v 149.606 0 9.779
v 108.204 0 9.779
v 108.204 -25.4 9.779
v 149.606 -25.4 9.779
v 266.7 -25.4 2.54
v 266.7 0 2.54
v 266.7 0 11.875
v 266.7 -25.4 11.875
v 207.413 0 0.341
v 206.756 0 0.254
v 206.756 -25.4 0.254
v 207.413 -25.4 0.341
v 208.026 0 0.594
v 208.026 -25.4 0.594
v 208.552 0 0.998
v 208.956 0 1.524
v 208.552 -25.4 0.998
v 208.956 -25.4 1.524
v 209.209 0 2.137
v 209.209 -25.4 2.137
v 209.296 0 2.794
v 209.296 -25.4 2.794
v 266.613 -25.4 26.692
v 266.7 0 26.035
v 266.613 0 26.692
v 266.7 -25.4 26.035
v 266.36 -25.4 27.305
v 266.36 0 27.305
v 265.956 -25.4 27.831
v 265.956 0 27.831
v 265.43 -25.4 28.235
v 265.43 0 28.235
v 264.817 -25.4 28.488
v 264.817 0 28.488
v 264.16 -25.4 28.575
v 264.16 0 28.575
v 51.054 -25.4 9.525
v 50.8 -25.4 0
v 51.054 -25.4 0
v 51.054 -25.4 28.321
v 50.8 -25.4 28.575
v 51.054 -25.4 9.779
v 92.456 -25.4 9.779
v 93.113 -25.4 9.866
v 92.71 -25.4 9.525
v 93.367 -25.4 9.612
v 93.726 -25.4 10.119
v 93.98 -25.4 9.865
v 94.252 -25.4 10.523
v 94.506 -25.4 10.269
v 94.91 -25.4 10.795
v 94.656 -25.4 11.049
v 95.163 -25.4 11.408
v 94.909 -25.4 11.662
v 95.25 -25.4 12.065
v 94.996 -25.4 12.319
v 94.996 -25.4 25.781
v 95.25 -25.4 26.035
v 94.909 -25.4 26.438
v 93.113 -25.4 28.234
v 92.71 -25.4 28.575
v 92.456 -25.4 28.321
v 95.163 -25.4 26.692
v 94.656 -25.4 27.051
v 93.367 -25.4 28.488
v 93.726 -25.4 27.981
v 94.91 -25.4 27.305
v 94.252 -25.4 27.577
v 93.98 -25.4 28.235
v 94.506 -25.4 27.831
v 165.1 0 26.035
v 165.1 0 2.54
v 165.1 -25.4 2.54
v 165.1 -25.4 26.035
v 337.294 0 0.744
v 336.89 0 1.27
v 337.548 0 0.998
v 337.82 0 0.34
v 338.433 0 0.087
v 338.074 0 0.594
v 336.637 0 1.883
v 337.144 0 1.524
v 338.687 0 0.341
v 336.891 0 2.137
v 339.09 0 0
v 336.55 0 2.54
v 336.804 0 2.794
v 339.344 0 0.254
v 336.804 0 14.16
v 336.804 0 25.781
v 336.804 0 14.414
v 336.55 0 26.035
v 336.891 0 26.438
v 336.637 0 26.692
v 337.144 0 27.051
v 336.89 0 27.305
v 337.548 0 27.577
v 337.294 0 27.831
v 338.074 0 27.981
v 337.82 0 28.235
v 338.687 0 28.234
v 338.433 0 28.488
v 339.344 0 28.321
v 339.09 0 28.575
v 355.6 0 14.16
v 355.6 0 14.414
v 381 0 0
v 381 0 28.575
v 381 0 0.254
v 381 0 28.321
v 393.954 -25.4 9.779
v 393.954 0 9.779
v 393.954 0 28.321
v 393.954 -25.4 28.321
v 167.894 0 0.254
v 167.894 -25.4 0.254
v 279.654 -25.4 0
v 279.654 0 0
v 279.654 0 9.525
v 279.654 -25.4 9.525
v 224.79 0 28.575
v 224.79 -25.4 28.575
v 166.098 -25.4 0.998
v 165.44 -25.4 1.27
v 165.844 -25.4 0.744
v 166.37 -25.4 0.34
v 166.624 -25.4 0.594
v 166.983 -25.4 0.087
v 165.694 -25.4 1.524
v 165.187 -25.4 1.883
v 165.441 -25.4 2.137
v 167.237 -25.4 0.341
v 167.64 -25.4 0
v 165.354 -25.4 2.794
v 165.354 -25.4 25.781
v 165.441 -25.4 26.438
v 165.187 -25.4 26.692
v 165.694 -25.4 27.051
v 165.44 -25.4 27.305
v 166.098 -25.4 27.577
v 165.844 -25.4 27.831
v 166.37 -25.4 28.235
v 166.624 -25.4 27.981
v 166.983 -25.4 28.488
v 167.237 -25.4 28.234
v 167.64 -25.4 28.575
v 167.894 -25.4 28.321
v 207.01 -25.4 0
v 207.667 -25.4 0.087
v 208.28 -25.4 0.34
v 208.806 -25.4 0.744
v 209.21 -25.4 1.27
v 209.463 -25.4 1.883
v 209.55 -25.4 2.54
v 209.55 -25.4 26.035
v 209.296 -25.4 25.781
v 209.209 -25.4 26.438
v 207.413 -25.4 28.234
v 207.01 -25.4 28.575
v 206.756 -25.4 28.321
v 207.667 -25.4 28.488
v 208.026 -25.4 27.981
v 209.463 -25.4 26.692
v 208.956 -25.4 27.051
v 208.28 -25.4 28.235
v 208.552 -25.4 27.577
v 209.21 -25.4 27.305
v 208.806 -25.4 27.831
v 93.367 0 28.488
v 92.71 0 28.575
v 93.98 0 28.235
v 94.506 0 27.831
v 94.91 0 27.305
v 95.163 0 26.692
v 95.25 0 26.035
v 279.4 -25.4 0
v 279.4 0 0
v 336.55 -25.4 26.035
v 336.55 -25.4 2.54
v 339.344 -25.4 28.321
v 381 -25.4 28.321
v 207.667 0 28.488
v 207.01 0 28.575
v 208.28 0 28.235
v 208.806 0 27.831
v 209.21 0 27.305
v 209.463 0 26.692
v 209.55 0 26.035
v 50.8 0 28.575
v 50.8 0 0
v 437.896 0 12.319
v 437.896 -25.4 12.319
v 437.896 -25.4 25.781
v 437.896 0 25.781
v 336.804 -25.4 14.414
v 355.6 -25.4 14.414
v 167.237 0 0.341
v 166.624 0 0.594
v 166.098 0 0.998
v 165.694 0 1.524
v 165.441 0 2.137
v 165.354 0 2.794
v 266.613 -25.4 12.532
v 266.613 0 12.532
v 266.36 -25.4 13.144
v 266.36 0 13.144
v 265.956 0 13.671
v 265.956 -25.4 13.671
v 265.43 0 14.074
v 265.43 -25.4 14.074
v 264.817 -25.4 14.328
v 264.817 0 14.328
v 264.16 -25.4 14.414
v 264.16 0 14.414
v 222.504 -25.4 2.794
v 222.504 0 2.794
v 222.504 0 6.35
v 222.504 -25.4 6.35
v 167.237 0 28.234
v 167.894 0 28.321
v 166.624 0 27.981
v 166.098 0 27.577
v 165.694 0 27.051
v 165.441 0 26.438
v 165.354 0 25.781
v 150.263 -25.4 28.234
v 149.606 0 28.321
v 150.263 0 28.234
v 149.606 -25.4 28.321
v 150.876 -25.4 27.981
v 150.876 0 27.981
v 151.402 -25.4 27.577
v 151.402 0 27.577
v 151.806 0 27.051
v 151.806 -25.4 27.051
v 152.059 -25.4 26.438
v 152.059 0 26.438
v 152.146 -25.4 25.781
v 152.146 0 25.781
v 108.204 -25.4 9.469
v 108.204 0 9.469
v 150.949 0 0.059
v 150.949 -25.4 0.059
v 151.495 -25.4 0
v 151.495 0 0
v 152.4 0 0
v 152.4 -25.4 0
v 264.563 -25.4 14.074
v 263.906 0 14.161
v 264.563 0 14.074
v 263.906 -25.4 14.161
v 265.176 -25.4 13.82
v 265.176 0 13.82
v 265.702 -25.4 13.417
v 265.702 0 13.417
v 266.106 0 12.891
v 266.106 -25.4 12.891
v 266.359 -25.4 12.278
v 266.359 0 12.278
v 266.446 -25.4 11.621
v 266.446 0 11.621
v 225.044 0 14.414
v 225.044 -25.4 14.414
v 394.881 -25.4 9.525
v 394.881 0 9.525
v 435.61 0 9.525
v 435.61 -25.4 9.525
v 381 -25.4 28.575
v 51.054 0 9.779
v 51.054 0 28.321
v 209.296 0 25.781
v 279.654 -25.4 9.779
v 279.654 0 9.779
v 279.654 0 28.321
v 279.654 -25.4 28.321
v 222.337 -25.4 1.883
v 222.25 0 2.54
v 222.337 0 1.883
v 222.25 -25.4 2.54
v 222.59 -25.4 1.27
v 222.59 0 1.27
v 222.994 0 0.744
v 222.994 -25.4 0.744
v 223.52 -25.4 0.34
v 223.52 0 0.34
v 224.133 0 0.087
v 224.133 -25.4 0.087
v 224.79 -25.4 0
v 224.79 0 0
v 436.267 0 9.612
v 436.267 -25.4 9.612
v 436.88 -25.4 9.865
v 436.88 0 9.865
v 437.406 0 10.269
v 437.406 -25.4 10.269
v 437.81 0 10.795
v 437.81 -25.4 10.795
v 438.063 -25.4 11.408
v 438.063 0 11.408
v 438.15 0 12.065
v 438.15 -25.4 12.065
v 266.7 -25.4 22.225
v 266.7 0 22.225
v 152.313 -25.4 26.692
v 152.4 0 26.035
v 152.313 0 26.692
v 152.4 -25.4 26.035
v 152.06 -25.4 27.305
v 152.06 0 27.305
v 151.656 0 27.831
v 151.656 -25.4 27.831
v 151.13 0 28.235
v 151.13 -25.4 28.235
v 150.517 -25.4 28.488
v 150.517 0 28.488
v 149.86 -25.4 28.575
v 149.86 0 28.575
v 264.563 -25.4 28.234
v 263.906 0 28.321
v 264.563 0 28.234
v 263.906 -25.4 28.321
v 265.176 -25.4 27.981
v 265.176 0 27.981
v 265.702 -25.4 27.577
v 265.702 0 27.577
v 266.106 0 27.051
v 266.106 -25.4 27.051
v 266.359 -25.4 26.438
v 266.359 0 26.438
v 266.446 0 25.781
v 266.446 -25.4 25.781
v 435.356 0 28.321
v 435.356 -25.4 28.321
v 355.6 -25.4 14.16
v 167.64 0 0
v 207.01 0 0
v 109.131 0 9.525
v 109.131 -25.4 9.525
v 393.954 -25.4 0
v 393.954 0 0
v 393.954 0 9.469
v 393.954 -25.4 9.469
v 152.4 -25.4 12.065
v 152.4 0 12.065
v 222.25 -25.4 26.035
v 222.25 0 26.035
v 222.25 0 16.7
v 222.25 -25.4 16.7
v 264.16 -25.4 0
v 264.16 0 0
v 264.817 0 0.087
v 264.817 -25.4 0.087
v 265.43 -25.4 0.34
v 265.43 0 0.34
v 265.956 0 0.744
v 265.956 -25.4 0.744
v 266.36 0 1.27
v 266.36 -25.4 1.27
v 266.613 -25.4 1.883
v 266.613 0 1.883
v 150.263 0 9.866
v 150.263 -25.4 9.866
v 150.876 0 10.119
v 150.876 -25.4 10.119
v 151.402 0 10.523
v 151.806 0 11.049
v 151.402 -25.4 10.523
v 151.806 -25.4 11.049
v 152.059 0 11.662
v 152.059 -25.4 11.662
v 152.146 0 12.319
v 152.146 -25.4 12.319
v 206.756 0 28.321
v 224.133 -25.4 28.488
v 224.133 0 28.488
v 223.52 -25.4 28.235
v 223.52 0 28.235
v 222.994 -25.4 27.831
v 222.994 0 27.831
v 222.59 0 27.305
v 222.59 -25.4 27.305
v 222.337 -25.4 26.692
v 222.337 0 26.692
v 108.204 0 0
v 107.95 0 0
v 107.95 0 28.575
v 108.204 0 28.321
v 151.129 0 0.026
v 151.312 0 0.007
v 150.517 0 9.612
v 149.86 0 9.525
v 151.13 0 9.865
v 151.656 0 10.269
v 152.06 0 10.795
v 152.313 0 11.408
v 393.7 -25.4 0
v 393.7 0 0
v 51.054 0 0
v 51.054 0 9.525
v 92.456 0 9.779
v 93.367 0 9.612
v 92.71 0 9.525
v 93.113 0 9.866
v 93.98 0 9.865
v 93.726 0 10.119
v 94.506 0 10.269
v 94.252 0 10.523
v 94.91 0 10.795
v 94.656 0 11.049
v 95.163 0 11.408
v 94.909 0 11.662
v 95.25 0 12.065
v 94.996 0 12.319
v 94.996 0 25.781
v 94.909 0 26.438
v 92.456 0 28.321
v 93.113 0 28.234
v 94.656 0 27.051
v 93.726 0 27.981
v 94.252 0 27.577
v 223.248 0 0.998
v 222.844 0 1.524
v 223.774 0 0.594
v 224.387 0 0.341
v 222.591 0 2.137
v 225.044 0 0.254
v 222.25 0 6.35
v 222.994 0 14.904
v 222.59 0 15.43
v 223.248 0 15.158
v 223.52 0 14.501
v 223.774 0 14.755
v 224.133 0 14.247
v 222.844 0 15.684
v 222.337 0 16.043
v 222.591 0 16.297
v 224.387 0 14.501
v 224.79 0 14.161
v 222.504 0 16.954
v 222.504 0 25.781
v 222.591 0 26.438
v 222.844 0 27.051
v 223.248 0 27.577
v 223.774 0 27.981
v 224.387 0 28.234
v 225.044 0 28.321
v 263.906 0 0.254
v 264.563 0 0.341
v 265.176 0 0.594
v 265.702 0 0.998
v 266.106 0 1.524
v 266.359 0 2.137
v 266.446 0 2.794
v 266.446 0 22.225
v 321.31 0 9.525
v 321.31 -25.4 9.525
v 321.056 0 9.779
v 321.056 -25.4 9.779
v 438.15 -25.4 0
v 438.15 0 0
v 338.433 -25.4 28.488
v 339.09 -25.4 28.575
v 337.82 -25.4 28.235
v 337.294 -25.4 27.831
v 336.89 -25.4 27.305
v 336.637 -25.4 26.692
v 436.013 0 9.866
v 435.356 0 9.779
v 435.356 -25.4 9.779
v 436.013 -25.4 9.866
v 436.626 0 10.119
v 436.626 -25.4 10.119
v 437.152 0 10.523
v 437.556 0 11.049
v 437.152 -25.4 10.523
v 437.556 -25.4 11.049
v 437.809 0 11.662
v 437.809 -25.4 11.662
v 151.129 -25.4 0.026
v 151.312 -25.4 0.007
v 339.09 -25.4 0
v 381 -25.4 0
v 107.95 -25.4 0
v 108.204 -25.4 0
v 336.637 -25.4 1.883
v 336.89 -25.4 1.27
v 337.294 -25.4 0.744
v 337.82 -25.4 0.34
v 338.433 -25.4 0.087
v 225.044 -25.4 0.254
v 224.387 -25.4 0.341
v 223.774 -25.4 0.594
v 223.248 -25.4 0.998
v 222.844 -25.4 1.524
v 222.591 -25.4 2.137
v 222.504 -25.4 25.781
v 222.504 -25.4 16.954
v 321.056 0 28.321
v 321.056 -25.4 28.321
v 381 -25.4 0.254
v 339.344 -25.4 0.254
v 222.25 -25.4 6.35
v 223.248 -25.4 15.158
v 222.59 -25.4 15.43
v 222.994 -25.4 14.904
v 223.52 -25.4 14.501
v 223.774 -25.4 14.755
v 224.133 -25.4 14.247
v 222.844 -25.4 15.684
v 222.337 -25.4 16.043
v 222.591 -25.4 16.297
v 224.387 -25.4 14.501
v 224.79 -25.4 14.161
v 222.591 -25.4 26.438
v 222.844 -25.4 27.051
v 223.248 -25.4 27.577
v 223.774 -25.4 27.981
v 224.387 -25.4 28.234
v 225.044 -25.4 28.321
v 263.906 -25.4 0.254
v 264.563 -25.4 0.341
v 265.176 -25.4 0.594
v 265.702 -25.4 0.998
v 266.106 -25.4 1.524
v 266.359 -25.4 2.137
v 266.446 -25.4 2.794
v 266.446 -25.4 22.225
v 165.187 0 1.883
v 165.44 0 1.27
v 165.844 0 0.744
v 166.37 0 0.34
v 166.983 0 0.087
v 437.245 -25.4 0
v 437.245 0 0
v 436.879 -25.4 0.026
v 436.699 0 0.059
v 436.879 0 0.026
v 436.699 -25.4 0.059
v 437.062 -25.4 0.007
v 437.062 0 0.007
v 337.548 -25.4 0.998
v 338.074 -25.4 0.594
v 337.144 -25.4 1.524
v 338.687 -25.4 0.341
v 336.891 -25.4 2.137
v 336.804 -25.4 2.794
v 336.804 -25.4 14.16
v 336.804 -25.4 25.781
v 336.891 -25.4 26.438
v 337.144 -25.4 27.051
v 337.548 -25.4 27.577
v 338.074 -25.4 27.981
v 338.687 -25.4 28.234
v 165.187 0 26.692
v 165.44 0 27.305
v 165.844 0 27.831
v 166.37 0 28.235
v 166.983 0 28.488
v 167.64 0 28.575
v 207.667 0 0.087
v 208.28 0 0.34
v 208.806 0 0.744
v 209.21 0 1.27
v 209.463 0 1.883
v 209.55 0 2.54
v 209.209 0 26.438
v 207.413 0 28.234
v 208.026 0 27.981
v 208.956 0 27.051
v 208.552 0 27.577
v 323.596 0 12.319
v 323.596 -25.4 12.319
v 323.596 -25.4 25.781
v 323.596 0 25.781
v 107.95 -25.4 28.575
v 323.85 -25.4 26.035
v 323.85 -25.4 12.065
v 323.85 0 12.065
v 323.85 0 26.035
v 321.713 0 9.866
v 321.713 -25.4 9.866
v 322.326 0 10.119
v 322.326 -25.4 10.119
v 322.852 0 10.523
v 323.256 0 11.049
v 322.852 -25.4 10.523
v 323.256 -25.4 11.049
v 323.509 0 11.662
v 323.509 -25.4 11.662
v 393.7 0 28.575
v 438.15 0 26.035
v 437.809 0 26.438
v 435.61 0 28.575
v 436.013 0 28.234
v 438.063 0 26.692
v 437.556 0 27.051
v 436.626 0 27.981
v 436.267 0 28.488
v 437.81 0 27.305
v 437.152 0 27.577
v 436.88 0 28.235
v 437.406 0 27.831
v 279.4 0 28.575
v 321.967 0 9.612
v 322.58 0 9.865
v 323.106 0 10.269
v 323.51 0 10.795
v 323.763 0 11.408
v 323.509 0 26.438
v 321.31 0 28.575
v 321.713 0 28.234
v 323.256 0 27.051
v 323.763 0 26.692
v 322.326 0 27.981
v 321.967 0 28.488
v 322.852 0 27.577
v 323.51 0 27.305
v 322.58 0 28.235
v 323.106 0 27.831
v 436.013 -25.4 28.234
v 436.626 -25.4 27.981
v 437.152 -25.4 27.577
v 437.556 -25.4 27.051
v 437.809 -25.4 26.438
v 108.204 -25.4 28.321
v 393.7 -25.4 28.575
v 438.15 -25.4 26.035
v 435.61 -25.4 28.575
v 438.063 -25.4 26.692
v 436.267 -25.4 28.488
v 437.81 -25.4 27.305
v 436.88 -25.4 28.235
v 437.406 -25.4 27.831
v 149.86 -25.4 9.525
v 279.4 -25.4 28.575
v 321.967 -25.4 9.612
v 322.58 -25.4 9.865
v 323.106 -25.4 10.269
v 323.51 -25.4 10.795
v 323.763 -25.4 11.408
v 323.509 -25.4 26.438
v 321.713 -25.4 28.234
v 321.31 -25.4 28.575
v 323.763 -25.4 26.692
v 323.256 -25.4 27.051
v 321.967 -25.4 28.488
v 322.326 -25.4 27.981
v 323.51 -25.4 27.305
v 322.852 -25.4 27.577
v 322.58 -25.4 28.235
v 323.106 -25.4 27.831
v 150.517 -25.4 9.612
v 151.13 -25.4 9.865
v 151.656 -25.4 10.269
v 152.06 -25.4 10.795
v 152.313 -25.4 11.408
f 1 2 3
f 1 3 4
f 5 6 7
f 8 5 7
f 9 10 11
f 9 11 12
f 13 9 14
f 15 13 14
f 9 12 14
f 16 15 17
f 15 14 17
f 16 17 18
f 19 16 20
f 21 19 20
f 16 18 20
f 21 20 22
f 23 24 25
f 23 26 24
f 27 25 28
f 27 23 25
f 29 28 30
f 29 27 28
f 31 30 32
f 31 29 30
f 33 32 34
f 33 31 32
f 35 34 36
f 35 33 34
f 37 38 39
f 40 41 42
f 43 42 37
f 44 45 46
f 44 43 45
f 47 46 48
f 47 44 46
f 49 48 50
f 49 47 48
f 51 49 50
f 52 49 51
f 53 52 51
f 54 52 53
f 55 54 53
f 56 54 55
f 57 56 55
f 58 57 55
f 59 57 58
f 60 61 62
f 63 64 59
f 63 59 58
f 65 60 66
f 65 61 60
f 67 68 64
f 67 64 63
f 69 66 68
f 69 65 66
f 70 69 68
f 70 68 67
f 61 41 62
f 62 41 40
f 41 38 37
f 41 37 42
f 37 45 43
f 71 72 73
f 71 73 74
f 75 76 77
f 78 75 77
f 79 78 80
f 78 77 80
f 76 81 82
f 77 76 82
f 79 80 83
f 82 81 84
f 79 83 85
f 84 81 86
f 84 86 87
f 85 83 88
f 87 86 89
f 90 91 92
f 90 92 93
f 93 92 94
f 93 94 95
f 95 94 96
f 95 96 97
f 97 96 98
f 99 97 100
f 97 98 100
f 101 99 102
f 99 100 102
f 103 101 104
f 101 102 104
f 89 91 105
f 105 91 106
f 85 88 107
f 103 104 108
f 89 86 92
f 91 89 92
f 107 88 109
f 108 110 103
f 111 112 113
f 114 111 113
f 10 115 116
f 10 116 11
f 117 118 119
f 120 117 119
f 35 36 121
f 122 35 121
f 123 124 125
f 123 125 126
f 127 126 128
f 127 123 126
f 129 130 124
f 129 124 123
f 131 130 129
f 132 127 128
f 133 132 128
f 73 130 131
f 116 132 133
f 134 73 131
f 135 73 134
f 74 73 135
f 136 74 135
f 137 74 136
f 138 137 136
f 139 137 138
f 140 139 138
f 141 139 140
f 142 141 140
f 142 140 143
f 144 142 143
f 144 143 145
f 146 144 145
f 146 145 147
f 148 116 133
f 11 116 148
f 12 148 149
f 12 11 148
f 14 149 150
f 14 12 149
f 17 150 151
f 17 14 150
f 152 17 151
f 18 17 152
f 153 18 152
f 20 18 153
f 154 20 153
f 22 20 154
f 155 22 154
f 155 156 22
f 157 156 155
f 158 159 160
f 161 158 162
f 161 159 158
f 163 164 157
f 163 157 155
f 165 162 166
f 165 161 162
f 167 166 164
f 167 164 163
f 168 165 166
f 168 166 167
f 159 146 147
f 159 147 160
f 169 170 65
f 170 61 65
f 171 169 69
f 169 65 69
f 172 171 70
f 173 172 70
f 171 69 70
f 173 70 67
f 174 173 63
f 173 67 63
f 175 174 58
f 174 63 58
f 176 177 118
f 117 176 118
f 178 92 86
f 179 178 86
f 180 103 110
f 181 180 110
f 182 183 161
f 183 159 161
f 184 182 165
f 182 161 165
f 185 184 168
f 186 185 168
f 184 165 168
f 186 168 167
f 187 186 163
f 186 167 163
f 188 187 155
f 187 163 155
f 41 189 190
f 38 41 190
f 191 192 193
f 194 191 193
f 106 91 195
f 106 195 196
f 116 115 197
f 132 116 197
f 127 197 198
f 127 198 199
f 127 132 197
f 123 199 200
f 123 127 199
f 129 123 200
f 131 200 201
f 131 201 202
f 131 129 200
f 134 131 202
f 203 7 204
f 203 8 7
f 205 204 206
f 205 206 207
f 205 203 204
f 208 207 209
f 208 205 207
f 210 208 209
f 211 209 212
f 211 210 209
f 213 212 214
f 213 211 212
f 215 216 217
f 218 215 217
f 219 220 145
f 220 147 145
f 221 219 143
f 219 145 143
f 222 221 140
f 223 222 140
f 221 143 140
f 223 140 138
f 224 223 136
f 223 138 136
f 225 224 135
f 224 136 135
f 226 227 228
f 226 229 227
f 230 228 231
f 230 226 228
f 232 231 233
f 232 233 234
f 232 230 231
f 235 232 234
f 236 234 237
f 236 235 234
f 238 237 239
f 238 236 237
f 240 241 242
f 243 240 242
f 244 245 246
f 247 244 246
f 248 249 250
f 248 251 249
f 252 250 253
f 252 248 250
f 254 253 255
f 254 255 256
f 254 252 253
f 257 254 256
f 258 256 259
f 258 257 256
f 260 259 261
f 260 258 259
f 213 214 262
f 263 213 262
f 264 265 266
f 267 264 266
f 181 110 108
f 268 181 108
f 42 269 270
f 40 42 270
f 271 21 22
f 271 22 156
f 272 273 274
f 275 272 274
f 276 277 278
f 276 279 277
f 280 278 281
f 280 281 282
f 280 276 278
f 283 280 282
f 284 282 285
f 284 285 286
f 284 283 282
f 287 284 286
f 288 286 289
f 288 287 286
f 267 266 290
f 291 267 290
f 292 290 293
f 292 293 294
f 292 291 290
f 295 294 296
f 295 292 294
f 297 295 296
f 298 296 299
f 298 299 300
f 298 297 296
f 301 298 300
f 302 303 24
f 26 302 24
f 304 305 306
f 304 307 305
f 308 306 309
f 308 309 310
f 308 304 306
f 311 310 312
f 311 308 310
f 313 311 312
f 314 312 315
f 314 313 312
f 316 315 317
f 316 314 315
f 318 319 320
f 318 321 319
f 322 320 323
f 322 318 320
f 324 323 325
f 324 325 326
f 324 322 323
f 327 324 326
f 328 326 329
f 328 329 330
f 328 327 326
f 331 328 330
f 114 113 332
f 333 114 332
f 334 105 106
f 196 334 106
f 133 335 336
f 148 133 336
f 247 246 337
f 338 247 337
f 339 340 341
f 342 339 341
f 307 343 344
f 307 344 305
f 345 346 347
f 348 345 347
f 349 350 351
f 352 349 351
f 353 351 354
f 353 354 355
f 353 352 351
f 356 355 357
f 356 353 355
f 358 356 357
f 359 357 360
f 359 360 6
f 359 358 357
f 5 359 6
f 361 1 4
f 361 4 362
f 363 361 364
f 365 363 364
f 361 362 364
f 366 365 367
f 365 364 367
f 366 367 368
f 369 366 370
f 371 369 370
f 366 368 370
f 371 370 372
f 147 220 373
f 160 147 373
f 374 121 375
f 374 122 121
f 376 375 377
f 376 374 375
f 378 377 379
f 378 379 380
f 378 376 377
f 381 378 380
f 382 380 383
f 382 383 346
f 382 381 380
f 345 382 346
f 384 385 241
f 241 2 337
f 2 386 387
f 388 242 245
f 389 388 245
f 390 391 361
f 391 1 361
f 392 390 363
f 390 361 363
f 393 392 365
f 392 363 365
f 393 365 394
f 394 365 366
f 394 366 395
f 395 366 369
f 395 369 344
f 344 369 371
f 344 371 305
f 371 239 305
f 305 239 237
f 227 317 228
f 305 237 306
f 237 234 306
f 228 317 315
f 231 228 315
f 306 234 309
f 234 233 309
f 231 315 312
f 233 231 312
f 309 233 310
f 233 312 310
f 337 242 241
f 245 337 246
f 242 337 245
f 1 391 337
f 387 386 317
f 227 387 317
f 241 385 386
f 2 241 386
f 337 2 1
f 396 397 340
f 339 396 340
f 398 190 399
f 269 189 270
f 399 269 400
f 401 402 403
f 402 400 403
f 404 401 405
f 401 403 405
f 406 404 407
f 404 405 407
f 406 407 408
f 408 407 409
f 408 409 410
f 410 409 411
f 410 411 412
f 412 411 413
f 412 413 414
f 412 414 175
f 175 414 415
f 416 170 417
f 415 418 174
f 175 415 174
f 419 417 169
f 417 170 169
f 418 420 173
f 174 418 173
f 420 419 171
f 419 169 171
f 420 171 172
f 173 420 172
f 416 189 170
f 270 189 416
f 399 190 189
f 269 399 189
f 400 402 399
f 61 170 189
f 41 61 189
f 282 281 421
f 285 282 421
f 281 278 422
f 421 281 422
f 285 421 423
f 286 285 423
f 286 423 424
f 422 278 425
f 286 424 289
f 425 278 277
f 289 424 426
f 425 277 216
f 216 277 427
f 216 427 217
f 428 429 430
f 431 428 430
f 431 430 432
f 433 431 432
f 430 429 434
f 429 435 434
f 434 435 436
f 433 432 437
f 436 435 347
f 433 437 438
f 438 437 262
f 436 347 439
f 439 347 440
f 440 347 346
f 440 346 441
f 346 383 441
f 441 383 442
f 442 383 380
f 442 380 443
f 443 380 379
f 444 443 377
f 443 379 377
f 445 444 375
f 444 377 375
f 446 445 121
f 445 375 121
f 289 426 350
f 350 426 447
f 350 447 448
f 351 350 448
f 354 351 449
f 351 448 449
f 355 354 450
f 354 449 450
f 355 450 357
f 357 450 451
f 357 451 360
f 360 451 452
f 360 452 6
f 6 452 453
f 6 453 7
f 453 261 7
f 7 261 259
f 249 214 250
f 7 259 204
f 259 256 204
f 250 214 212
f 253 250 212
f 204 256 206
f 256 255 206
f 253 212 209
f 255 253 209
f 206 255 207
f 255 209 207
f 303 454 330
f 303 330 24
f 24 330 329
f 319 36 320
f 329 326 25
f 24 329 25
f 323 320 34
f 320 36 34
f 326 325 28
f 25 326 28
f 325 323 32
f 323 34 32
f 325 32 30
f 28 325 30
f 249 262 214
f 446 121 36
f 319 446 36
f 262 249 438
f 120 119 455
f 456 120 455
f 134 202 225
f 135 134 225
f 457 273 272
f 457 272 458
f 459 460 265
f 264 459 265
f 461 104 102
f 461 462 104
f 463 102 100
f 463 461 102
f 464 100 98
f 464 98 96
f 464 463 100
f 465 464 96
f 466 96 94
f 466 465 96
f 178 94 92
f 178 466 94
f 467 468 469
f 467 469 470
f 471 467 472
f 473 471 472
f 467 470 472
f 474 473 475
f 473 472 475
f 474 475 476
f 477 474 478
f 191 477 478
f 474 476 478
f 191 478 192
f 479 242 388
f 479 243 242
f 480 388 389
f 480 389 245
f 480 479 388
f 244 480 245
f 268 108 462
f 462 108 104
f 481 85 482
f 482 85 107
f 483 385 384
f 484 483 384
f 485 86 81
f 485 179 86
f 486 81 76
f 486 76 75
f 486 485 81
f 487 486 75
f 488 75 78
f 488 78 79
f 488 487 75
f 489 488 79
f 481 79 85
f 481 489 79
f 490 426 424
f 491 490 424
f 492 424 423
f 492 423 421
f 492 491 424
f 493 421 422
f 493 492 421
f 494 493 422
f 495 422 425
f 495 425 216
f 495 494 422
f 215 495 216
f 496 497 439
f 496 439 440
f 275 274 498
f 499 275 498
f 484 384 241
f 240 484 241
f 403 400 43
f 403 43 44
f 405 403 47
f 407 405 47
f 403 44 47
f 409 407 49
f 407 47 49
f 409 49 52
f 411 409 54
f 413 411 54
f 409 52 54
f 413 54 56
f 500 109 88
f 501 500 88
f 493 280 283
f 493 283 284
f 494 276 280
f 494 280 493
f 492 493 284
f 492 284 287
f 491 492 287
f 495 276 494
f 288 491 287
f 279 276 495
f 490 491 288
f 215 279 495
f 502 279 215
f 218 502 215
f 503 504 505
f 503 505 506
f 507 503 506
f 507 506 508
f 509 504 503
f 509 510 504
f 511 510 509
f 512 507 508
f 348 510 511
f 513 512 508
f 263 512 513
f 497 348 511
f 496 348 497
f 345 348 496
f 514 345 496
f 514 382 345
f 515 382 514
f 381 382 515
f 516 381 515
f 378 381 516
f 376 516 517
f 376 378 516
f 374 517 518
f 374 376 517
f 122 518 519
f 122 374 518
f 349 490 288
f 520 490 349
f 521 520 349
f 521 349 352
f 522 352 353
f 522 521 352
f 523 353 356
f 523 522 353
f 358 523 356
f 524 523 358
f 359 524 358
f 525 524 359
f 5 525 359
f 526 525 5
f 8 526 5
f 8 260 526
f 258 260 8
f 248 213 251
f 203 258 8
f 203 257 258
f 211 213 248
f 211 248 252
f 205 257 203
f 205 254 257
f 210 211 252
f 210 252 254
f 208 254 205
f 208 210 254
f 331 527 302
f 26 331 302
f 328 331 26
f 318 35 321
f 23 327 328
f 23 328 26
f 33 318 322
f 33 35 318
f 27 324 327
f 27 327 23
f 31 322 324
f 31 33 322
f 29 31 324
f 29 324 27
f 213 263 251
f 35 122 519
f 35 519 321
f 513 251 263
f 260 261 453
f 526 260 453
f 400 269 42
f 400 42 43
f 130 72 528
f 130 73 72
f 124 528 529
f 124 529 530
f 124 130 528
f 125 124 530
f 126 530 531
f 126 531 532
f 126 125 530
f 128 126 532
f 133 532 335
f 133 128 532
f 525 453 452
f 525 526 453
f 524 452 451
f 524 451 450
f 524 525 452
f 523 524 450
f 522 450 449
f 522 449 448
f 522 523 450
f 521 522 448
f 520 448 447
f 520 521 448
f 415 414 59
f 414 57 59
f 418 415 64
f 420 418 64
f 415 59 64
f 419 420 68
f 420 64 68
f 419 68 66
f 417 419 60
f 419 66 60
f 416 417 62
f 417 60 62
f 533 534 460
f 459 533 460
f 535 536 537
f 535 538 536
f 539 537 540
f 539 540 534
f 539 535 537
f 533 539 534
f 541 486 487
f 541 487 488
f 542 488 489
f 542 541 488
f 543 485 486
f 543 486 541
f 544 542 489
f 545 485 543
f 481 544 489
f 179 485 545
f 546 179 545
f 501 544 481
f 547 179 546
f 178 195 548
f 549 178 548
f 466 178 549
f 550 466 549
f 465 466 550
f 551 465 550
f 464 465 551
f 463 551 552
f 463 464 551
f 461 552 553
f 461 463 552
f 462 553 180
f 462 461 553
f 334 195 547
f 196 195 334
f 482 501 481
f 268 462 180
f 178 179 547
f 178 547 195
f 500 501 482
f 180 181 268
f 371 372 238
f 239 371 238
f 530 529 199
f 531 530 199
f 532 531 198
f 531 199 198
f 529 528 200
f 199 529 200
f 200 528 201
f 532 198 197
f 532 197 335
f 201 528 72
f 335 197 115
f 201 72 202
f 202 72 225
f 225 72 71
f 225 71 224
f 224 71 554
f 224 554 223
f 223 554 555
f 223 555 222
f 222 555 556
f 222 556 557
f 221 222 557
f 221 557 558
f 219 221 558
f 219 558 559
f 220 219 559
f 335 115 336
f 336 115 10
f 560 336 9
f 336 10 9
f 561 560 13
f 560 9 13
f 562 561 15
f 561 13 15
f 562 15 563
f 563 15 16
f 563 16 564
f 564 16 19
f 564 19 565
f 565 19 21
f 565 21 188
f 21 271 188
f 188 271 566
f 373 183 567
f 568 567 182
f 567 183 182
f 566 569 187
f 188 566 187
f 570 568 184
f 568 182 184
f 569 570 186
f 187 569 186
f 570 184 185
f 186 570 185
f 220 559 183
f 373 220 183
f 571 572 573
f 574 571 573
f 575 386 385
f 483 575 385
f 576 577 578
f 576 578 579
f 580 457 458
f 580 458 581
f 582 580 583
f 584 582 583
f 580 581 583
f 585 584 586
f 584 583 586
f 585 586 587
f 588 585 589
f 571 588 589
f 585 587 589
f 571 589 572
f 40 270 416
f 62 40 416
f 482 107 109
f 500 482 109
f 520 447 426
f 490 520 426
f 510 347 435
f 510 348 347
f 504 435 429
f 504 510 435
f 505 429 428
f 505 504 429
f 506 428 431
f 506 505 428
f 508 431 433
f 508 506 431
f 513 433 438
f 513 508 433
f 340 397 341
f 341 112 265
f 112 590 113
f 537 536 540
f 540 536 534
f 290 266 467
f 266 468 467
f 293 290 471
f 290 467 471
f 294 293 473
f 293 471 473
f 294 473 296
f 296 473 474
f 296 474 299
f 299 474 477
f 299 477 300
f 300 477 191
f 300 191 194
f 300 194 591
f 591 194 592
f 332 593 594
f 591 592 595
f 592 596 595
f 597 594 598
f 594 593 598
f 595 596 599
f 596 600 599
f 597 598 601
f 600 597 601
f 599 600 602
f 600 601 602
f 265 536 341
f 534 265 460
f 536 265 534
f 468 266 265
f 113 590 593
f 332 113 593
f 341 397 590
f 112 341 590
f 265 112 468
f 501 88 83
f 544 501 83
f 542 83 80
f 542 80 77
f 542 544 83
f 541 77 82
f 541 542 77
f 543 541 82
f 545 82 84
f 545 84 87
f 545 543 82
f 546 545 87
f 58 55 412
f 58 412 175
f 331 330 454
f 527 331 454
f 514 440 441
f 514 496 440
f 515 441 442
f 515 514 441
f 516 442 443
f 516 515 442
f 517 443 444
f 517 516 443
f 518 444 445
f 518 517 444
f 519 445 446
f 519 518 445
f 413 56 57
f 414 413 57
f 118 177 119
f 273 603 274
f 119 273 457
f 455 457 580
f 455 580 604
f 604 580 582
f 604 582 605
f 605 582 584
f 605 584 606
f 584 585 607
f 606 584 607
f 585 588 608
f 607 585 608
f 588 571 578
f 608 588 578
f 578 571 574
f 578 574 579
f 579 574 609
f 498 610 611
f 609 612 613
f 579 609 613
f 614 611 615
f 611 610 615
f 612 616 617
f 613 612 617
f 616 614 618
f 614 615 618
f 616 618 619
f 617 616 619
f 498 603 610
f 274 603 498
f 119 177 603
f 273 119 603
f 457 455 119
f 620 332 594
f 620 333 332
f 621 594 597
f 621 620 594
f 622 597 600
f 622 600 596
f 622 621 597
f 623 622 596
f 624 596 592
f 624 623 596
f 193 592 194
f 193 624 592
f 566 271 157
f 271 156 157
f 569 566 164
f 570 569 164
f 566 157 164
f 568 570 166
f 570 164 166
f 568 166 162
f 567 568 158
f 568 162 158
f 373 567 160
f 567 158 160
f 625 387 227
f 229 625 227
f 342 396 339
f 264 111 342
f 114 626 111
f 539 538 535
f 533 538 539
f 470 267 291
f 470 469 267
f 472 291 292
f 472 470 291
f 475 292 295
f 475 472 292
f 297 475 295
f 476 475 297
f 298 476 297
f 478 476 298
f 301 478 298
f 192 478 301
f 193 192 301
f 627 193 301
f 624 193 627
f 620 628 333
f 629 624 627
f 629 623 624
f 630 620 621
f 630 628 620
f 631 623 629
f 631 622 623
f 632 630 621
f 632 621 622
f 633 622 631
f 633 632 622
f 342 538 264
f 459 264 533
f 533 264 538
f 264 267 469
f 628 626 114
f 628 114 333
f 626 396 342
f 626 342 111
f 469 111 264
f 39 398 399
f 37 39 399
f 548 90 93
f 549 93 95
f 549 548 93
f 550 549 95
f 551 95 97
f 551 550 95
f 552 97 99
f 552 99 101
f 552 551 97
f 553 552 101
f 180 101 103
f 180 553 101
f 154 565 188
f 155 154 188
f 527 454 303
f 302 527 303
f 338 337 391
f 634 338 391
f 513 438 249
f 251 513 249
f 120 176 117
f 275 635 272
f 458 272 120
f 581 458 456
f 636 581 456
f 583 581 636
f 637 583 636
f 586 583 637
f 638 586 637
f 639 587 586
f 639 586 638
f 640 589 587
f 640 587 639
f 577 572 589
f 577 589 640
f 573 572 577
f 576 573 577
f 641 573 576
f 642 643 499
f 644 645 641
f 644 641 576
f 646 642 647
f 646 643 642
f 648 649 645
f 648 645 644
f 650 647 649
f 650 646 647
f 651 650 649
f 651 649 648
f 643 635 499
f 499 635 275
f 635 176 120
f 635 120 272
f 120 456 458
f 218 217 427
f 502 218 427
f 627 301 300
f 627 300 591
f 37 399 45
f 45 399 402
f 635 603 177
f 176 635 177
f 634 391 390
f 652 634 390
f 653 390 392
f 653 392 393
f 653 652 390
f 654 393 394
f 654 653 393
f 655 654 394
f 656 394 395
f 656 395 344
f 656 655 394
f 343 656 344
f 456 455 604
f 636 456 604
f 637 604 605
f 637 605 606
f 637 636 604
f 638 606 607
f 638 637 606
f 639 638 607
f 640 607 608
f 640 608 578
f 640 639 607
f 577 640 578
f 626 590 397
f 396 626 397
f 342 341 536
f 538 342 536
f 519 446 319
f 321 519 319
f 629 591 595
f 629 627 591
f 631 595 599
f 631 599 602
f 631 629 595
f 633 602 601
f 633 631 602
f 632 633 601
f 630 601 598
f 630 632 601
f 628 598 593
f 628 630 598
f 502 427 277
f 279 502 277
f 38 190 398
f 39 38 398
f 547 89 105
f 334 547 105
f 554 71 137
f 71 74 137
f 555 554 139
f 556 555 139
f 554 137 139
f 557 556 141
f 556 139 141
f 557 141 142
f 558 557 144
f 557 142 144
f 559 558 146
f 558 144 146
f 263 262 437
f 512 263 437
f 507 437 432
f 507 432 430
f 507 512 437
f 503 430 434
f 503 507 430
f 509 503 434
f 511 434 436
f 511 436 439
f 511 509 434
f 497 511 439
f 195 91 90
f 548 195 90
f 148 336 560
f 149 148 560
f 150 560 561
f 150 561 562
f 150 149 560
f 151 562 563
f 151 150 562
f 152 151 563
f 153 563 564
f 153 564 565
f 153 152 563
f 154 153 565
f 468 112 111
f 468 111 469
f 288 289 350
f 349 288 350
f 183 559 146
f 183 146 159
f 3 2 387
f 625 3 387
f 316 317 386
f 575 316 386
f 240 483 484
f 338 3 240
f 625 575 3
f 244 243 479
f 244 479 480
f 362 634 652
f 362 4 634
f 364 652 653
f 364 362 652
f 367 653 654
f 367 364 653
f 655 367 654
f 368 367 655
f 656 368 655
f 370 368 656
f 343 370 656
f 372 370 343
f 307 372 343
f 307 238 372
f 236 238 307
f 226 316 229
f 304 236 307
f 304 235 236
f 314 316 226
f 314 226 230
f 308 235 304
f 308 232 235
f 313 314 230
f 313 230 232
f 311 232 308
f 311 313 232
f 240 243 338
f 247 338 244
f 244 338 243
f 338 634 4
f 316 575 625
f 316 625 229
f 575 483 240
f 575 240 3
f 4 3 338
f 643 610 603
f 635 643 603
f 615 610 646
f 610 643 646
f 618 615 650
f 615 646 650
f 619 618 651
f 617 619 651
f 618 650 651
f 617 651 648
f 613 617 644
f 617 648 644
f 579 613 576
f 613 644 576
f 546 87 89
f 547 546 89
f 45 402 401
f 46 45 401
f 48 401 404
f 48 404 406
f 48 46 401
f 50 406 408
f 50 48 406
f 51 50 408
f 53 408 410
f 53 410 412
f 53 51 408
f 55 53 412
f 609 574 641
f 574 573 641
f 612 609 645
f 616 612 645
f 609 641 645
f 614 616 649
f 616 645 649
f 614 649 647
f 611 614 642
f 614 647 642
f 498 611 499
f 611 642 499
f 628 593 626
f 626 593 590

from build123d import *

# Parameters (mm, degrees)
F0_W     = 0.254
F0_H     = 9.525
F0_H_2   = 0.254
F0_W_2   = 43.942
F0_H_3   = 18.542
F1_DEPTH = 25.4
F0_W_3   = 44.45
F0_H_4   = 28.575
F0_H_5   = 28.067
F0_H_6   = 0.127
F0_W_4   = 18.796
F2_R     = 2.54
F2_2_R   = 2.54
F2_3_R   = 2.54
F2_4_R   = 2.54
F2_5_R   = 2.54
F2_6_R   = 2.54
F2_7_R   = 2.54


with BuildPart() as f1:
    # F0 (on Front) → F1 (new body)
    with BuildSketch(Plane.XZ):
        with Locations((50.927, 4.7625)):
            Rectangle(F0_W, F0_H)
        with Locations((50.927, 9.652)):
            Rectangle(F0_W, F0_H_2)
        Polygon((50.8, 28.575), (50.8, 9.779), (51.054, 9.779), (51.054, 9.525), (95.25, 9.525), (95.25, 28.575), align=None)
        with Locations((73.025, 19.05)):
            Rectangle(F0_W_2, F0_H_3, mode=Mode.SUBTRACT)
    extrude(amount=F1_DEPTH)

    # F2#2
    f2_2_edges = [f1.edges().sort_by_distance(p)[0] for p in [
        (94.996, -12.7, 28.321),
        (94.996, -12.7, 9.779),
        (95.25, -12.7, 28.575),
        (95.25, -12.7, 9.525),
    ]]
    fillet(f2_2_edges, radius=F2_2_R)


with BuildPart() as f1b:
    # F0 (on Front) → F1, piece 2 (new body)
    with BuildSketch(Plane.XZ):
        Polygon((107.95, 9.525), (107.95, 0), (108.204, 0), (108.204, 9.4690852478), align=None)
        with Locations((108.077, 9.652)):
            Rectangle(F0_W, F0_H_2)
        Polygon((108.204, 9.525), (107.95, 9.525), (108.204, 9.4690852478), align=None)
        Polygon((107.95, 28.575), (107.95, 9.779), (108.204, 9.779), (108.204, 9.525), (109.131454517, 9.525), (152.4, 9.525), (152.4, 28.575), align=None)
        with Locations((130.175, 19.05)):
            Rectangle(F0_W_2, F0_H_3, mode=Mode.SUBTRACT)
        Polygon((109.131454517, 9.525), (108.204, 9.525), (108.204, 9.4690852478), (151.218545483, 0), (152.4, 0), align=None)
    extrude(amount=F1_DEPTH)

    # F2
    f2_edges = [f1b.edges().sort_by_distance(p)[0] for p in [
        (152.4, -12.7, 9.525),
        (151.218545, -12.7, 0),
        (152.4, -12.7, 28.575),
        (152.146, -12.7, 28.321),
        (152.146, -12.7, 9.779),
    ]]
    fillet(f2_edges, radius=F2_R)


with BuildPart() as f1c:
    # F0 (on Front) → F1, piece 3 (new body)
    with BuildSketch(Plane.XZ):
        with Locations((187.325, 14.2875)):
            Rectangle(F0_W_3, F0_H_4)
        with Locations((187.325, 14.2875)):
            Rectangle(F0_W_2, F0_H_5, mode=Mode.SUBTRACT)
    extrude(amount=F1_DEPTH)

    # F2#3
    f2_3_edges = [f1c.edges().sort_by_distance(p)[0] for p in [
        (209.296, -12.7, 0.254),
        (165.354, -12.7, 0.254),
        (209.55, -12.7, 28.575),
        (209.55, -12.7, 0),
        (165.1, -12.7, 28.575),
        (165.354, -12.7, 28.321),
        (165.1, -12.7, 0),
        (209.296, -12.7, 28.321),
    ]]
    fillet(f2_3_edges, radius=F2_3_R)


with BuildPart() as f1d:
    # F0 (on Front) → F1, piece 4 (new body)
    with BuildSketch(Plane.XZ):
        Polygon((222.504, 6.35), (222.25, 6.35), (222.25, 0), (266.7, 0), (266.7, 14.2875), (222.25, 14.2875), (222.25, 14.1605), (266.446, 14.1605), (266.446, 0.254), (222.504, 0.254), align=None)
        Polygon((222.25, 14.2875), (266.7, 14.2875), (266.7, 14.4145), (222.504, 14.4145), (222.504, 28.321), (266.446, 28.321), (266.446, 22.225), (266.7, 22.225), (266.7, 28.575), (222.25, 28.575), align=None)
    extrude(amount=F1_DEPTH)

    # F2#4
    f2_4_edges = [f1d.edges().sort_by_distance(p)[0] for p in [
        (222.504, -12.7, 0.254),
        (266.446, -12.7, 14.1605),
        (266.446, -12.7, 28.321),
        (266.446, -12.7, 0.254),
        (222.504, -12.7, 14.4145),
        (222.504, -12.7, 28.321),
        (222.25, -12.7, 28.575),
        (222.25, -12.7, 14.1605),
        (222.25, -12.7, 0),
        (266.7, -12.7, 14.4145),
        (266.7, -12.7, 0),
        (266.7, -12.7, 28.575),
    ]]
    fillet(f2_4_edges, radius=F2_4_R)


with BuildPart() as f1e:
    # F0 (on Front) → F1, piece 5 (new body)
    with BuildSketch(Plane.XZ):
        with Locations((279.527, 4.7625)):
            Rectangle(F0_W, F0_H)
        with Locations((279.527, 9.652)):
            Rectangle(F0_W, F0_H_2)
        Polygon((279.4, 28.575), (279.4, 9.779), (279.654, 9.779), (279.654, 9.525), (323.85, 9.525), (323.85, 28.575), align=None)
        with Locations((301.625, 19.05)):
            Rectangle(F0_W_2, F0_H_3, mode=Mode.SUBTRACT)
    extrude(amount=F1_DEPTH)

    # F2#5
    f2_5_edges = [f1e.edges().sort_by_distance(p)[0] for p in [
        (323.596, -12.7, 9.779),
        (323.596, -12.7, 28.321),
        (323.85, -12.7, 9.525),
        (323.85, -12.7, 28.575),
    ]]
    fillet(f2_5_edges, radius=F2_5_R)


with BuildPart() as f1f:
    # F0 (on Front) → F1, piece 6 (new body)
    with BuildSketch(Plane.XZ):
        Polygon((381, 28.575), (336.55, 28.575), (336.55, 14.4145), (336.804, 14.4145), (336.804, 28.321), (381, 28.321), align=None)
        with Locations((336.677, 14.351)):
            Rectangle(F0_W, F0_H_6)
        with Locations((336.677, 14.224)):
            Rectangle(F0_W, F0_H_6)
        with Locations((346.202, 14.351)):
            Rectangle(F0_W_4, F0_H_6)
        Polygon((336.804, 14.1605), (336.55, 14.1605), (336.55, 0), (381, 0), (381, 0.254), (336.804, 0.254), align=None)
        with Locations((346.202, 14.224)):
            Rectangle(F0_W_4, F0_H_6)
    extrude(amount=F1_DEPTH)

    # F2#6
    f2_6_edges = [f1f.edges().sort_by_distance(p)[0] for p in [
        (336.804, -12.7, 0.254),
        (336.55, -12.7, 28.575),
        (336.804, -12.7, 28.321),
        (336.55, -12.7, 0),
    ]]
    fillet(f2_6_edges, radius=F2_6_R)


with BuildPart() as f1g:
    # F0 (on Front) → F1, piece 7 (new body)
    with BuildSketch(Plane.XZ):
        Polygon((393.7, 9.525), (393.7, 0), (393.954, 0), (393.954, 9.4690852478), align=None)
        with Locations((393.827, 9.652)):
            Rectangle(F0_W, F0_H_2)
        Polygon((393.954, 9.525), (393.7, 9.525), (393.954, 9.4690852478), align=None)
        Polygon((393.7, 28.575), (393.7, 9.779), (393.954, 9.779), (393.954, 9.525), (394.881454517, 9.525), (438.15, 9.525), (438.15, 28.575), align=None)
        with Locations((415.925, 19.05)):
            Rectangle(F0_W_2, F0_H_3, mode=Mode.SUBTRACT)
        Polygon((394.881454517, 9.525), (393.954, 9.525), (393.954, 9.4690852478), (436.968545483, 0), (438.15, 0), align=None)
    extrude(amount=F1_DEPTH)

    # F2#7
    f2_7_edges = [f1g.edges().sort_by_distance(p)[0] for p in [
        (438.15, -12.7, 28.575),
        (437.896, -12.7, 28.321),
        (438.15, -12.7, 9.525),
        (436.968545, -12.7, 0),
        (437.896, -12.7, 9.779),
    ]]
    fillet(f2_7_edges, radius=F2_7_R)


solid = Compound([f1.part, f1b.part, f1c.part, f1d.part, f1e.part, f1f.part, f1g.part])
